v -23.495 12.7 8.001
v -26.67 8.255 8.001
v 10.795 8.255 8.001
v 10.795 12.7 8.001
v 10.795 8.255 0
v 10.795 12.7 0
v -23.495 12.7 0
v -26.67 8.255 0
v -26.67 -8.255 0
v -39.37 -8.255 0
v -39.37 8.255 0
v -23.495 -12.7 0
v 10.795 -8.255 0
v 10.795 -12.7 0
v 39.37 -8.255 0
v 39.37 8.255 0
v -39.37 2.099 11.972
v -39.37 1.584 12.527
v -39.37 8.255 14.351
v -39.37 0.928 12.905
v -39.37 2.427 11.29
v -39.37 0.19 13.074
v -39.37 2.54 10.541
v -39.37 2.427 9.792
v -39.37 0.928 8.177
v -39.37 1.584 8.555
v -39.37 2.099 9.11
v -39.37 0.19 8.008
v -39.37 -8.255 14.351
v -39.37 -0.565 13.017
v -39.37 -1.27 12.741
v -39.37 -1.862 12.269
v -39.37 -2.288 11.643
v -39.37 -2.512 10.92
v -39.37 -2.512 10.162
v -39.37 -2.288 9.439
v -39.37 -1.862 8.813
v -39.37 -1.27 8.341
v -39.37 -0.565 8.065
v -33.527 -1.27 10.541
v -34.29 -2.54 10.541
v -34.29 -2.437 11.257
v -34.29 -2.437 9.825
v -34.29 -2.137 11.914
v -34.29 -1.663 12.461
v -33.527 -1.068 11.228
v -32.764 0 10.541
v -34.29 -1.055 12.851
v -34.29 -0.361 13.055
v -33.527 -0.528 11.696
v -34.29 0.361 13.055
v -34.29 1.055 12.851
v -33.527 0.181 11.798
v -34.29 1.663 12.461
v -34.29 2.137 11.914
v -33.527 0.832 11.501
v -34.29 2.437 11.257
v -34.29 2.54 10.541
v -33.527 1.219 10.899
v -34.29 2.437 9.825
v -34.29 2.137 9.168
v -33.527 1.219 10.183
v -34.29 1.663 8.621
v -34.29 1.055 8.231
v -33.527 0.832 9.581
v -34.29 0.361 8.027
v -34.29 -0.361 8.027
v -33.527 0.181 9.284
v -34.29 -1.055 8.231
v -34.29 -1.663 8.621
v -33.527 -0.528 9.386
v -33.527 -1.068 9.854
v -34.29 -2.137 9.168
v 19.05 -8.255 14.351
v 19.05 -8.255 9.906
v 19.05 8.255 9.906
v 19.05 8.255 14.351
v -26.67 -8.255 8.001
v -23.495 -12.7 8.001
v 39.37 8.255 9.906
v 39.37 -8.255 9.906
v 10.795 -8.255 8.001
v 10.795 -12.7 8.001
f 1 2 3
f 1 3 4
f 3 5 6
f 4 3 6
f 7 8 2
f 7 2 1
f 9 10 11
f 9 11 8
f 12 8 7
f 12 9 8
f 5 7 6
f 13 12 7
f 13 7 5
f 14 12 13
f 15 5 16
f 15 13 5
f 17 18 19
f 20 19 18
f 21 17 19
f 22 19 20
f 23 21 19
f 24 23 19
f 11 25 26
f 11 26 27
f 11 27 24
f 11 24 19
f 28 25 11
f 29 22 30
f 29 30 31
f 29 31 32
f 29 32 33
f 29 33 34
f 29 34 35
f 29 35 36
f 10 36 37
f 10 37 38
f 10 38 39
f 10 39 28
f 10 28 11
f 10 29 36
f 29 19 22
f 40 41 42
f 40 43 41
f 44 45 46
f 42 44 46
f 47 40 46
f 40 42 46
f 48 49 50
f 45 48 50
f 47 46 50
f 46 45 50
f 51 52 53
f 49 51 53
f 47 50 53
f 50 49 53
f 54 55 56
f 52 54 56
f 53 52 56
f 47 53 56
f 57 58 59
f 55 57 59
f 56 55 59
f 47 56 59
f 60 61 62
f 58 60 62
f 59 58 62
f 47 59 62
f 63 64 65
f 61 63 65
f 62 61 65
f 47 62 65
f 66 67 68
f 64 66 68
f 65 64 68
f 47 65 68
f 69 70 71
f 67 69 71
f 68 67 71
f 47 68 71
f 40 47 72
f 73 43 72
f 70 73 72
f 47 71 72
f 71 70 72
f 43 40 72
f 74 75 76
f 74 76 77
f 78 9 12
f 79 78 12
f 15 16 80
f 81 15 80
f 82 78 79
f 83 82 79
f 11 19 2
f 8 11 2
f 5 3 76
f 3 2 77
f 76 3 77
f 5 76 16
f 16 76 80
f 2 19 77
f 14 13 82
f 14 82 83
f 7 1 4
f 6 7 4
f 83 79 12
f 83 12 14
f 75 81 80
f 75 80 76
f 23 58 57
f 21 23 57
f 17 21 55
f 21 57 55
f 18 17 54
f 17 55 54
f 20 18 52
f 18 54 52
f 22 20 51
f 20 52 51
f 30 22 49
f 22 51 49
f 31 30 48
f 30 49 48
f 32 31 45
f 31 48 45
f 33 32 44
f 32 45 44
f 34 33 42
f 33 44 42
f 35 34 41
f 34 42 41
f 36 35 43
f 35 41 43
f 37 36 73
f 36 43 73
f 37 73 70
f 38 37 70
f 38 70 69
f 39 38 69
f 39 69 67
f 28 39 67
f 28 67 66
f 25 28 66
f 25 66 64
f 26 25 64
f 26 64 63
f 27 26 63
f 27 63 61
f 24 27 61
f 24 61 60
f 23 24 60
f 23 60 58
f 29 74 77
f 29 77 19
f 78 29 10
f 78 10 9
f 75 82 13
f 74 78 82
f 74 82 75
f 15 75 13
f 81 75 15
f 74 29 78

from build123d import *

# Parameters (mm, degrees)
F1_DEPTH      = 12.7
F1_DEPTH_BACK = 12.7
F3_D          = 5.08
F3_DEPTH      = 5.08
F3_TIP        = 1.5261859723
F5_DEPTH      = 92
F4_W          = 8.255
F4_H          = 4.445
F6_DEPTH      = 14.352
F8_W          = 20.32
F8_H          = 4.445
F9_DEPTH      = 9.907
F10_W         = 4.445
F10_H         = 6.35
F11_DEPTH     = 50.166


# Not quite as in the source:
# - an extrude ends at something that could not be found from the text; its depth is read off the source's solid
# - a pattern or mirror of a feature is missing from the dataset's text; its kind, count and spacing are read off the source's solid


with BuildPart() as f1:
    # F0 (on Front) → F1 (new body, two sides)
    with BuildSketch(Plane.XZ) as f1_sk:
        Polygon((-39.37, 14.351), (-39.37, 0), (39.37, 0), (39.37, 9.906), (19.05, 9.906), (19.05, 14.351), align=None)
    extrude(amount=F1_DEPTH)
    extrude(f1_sk.sketch, amount=-F1_DEPTH_BACK)

    # F3
    with Locations(Plane(origin=(-39.37, 0, 0), x_dir=(0, -1, 0), z_dir=(-1, 0, 0))):
        with Locations((0, 10.541)):
            Hole(F3_D / 2, depth=F3_DEPTH)
            with Locations((0, 0, -(F3_DEPTH + F3_TIP / 2))):  # 118° drill point
                Cone(0, F3_D / 2, F3_TIP, mode=Mode.SUBTRACT)

    # F5 (cut, through all): a face of the model
    f5_faces = [f1.faces().sort_by_distance(p)[0] for p in [
        (0, 0, 0),
    ]]
    extrude(f5_faces, amount=F5_DEPTH, mode=Mode.SUBTRACT)

    # F4 (on face) → F6 (cut, through all)
    with BuildSketch(Plane.XY.offset(14.351)):
        Polygon((-39.37, 12.7), (-39.37, 8.255), (-26.67, 8.255), (-23.495, 12.7), align=None)
        with Locations((14.9225, 10.4775)):
            Rectangle(F4_W, F4_H)
    extrude(amount=-F6_DEPTH, mode=Mode.SUBTRACT)

    # F7: F1 across plane


with BuildPart() as f1_1:
    add(f1.part)
    add(f1.part.mirror(Plane.XZ), mode=Mode.INTERSECT)

    # F8 (on face) → F9 (cut, through all)
    with BuildSketch(Plane.XY.offset(9.906)):
        with Locations((29.21, -10.4775)):
            Rectangle(F8_W, F8_H)
        with Locations((29.21, 10.4775)):
            Rectangle(F8_W, F8_H)
    extrude(amount=-F9_DEPTH, mode=Mode.SUBTRACT)

    # F10 (on face) → F11 (cut, through all)
    with BuildSketch(Plane.YZ.offset(10.795)):
        with Locations((10.4775, 11.176)):
            Rectangle(F10_W, F10_H)
    f11 = extrude(amount=-F11_DEPTH, mode=Mode.SUBTRACT)

    # F11_copies: F11 across plane
    add(f11.mirror(Plane(origin=(0, 0, 0), x_dir=(0, 0, -1), z_dir=(0, -1, 0))), mode=Mode.SUBTRACT)


solid = f1_1.part
